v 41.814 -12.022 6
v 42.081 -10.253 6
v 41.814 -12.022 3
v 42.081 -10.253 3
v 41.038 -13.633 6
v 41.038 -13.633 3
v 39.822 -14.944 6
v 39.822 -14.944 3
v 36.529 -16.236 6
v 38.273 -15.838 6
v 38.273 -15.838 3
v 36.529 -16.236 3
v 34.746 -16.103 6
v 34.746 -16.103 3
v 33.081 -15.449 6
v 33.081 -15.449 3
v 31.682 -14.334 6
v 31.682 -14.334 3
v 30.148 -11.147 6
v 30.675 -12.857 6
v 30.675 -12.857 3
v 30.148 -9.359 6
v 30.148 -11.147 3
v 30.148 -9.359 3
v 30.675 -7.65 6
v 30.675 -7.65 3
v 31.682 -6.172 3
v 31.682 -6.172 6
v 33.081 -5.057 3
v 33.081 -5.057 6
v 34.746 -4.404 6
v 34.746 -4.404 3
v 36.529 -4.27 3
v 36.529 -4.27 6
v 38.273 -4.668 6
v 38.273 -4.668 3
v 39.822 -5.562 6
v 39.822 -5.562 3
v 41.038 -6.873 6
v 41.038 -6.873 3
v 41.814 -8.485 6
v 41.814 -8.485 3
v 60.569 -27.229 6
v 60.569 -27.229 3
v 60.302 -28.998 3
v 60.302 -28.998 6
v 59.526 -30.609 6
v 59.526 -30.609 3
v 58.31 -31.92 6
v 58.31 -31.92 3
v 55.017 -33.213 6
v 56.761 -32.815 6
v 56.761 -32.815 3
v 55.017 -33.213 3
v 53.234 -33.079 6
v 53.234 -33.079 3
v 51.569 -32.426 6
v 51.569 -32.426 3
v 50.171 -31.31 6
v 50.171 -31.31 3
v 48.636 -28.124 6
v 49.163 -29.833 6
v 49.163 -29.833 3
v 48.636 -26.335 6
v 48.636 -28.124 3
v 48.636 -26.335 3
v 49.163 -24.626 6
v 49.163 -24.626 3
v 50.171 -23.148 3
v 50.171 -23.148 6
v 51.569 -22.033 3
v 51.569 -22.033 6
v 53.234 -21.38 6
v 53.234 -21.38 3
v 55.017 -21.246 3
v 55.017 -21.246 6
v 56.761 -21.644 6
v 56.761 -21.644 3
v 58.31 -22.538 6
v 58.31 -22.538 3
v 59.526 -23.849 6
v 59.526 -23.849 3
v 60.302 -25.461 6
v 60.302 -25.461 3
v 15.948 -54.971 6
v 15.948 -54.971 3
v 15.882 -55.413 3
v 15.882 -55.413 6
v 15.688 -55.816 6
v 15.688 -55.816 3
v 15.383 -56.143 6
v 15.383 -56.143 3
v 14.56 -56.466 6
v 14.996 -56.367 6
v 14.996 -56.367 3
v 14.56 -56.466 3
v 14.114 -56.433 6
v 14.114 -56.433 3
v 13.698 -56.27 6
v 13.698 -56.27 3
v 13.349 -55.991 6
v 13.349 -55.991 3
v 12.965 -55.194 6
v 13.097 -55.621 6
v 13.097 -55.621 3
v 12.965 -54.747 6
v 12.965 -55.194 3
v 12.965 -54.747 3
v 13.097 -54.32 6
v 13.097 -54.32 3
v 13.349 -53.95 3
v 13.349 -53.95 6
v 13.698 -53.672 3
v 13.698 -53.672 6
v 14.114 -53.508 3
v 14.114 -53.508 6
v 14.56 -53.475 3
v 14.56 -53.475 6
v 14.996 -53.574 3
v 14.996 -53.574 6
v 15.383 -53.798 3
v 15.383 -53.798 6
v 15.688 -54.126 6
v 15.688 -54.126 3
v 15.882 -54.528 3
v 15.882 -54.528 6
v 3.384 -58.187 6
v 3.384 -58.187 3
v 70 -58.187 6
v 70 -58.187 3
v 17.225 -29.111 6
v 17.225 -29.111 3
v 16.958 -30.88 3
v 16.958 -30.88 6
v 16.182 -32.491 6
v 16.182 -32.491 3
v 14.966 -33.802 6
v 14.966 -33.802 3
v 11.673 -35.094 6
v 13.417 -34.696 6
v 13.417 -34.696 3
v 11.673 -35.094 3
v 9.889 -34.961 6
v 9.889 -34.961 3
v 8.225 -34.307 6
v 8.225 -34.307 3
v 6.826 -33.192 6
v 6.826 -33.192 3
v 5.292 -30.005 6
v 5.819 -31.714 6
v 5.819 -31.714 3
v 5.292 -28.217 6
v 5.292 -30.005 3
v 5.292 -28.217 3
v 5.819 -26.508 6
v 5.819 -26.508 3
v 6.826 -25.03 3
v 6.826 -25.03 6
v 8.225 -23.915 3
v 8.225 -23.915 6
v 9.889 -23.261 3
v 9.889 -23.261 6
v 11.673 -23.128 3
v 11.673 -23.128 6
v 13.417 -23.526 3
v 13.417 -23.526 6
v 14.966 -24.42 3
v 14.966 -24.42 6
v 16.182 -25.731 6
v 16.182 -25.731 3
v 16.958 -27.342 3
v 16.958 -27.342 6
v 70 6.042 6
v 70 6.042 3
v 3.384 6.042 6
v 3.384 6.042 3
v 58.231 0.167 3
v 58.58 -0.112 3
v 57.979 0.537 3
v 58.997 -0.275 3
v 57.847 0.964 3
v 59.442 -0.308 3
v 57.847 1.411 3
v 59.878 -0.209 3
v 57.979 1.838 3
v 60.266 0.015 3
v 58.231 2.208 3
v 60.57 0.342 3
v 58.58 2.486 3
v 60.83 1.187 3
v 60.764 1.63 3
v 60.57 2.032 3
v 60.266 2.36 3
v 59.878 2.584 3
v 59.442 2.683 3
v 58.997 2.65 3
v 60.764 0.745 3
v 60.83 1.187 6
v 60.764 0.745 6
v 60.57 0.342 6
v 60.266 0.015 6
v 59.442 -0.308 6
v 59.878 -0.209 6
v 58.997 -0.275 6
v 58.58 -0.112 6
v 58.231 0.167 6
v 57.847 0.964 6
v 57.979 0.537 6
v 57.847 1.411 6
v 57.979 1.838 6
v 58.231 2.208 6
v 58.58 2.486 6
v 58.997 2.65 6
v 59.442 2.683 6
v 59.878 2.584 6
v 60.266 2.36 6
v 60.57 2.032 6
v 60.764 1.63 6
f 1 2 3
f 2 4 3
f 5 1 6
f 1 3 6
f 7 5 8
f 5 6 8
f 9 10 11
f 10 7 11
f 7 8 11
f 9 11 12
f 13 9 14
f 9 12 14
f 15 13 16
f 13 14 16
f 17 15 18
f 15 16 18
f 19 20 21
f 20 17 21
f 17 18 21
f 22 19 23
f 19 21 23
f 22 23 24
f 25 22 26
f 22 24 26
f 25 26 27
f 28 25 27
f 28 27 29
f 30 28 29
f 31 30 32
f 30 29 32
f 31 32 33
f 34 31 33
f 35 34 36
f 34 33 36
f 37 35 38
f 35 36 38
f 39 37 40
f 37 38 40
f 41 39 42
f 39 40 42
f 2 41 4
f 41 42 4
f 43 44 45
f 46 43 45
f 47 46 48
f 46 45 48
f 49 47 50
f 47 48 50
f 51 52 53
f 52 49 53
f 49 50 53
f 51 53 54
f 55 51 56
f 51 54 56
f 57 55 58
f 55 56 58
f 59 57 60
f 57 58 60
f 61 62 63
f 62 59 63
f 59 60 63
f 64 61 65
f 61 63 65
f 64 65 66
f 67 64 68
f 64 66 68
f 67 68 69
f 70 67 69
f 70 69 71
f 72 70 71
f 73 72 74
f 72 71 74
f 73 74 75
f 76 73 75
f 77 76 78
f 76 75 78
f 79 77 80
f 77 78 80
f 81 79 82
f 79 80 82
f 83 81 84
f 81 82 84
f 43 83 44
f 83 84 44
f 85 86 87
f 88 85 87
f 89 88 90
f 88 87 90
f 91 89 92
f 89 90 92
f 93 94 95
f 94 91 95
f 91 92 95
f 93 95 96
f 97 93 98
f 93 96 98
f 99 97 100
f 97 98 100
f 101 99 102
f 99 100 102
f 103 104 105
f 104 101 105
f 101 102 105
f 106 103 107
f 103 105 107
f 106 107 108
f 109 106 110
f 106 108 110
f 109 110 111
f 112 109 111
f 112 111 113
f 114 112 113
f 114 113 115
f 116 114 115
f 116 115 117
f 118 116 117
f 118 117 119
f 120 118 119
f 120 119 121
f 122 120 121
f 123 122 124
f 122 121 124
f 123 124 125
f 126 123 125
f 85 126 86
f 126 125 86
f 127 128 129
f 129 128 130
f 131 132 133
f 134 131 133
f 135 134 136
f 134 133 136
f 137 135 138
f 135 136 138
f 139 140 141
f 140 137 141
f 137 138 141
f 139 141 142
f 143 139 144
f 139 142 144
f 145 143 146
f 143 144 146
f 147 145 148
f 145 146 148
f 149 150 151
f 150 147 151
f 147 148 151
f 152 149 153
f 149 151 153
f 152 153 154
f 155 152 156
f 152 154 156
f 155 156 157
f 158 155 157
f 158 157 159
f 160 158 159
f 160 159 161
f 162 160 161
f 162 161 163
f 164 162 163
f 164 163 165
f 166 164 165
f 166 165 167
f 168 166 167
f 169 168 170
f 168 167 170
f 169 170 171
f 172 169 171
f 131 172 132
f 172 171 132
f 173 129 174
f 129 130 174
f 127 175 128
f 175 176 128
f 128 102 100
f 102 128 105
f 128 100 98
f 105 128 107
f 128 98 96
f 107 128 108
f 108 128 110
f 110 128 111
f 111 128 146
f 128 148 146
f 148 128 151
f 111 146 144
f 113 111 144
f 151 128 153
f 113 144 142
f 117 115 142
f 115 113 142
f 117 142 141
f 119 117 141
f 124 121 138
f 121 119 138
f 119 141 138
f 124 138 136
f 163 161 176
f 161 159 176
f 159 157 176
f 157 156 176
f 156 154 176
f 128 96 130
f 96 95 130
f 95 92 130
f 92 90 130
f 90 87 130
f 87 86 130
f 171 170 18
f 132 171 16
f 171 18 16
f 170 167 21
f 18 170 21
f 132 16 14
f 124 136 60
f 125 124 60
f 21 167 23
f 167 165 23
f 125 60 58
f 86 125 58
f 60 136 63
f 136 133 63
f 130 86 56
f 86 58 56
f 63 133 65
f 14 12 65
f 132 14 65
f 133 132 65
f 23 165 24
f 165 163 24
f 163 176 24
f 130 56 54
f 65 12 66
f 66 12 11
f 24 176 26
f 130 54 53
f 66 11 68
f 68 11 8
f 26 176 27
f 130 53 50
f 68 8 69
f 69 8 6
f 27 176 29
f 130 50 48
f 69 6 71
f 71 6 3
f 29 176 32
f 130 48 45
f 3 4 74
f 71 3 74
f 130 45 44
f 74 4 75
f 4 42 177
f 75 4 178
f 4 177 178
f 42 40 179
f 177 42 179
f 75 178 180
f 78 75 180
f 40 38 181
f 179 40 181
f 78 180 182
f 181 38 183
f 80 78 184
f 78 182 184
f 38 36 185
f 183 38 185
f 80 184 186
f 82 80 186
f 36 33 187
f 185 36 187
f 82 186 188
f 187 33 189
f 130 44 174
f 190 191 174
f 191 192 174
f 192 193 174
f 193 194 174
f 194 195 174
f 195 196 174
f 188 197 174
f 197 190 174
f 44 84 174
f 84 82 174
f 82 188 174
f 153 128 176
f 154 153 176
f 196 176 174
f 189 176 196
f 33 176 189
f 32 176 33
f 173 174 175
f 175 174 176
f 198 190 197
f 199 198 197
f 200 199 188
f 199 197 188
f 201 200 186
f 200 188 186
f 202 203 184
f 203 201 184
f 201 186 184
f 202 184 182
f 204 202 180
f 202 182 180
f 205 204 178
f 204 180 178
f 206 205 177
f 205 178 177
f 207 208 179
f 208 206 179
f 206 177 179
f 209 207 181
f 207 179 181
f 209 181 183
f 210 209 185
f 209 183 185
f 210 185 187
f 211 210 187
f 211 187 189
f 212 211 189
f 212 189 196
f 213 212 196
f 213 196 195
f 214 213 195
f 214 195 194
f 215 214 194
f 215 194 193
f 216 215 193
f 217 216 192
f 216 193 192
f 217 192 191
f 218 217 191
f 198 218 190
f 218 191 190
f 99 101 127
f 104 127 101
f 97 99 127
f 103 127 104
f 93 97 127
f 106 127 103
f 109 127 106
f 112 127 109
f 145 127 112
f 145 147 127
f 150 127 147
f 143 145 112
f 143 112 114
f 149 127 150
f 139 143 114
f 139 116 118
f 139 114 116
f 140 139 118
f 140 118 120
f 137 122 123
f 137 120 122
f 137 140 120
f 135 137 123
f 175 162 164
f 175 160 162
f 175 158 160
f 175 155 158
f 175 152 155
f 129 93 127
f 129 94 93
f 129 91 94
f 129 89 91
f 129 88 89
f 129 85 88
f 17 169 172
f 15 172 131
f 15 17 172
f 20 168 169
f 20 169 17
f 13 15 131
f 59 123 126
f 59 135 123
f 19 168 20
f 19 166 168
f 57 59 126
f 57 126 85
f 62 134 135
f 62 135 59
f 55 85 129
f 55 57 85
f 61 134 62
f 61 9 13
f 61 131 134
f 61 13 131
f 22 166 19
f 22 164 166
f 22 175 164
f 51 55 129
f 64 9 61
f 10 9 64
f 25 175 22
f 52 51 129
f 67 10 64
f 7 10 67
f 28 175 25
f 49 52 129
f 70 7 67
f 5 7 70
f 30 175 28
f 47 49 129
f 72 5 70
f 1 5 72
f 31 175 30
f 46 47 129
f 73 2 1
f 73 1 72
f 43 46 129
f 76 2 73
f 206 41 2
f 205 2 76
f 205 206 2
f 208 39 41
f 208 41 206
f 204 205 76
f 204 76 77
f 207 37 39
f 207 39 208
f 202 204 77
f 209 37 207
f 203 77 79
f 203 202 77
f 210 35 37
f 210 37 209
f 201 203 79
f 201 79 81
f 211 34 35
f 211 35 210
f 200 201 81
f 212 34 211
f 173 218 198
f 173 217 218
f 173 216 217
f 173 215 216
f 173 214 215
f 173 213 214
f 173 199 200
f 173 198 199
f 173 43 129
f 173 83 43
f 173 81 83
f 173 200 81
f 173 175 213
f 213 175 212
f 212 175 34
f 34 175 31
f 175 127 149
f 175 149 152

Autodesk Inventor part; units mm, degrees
ref_plane "YZ Plane" through (0, 0, 0) normal (1, 0, 0) x (0, 1, 0)
sketch "ギア線図" plane through (0, 0, 0) normal (0, 0, 1) x (1, 0, 0)
  circle A0 centre (11.2246, -29.111) radius 11.1
  circle A1 centre (54.569, -27.2294) radius 20.05
  circle A2 centre (54.569, -27.2294) radius 4.55
  circle A3 centre (36.0807, -10.2532) radius 11.1
  circle A4 centre (39.569, -43.72) radius 2.05
  circle A5 centre (69.569, -43.72) radius 2.05
  circle A6 centre (72.4026, -13.8541) radius 2.05
  circle A7 centre (39.569, -43.72) radius 15
  circle A8 centre (69.569, -43.72) radius 15
  circle A9 centre (72.4026, -13.8541) radius 15
  circle A10 centre (54.569, -27.2294) radius 5.5 construction
  circle A11 centre (11.2246, -29.111) radius 13 construction
  circle A12 centre (54.569, -27.2294) radius 20.5 construction
  circle A13 centre (36.0807, -10.2532) radius 20.55
  circle A14 centre (36.0807, -10.2532) radius 21.5 construction
  circle A15 centre (36.0807, -10.2532) radius 13 construction
  circle A16 centre (39.569, -43.72) radius 2.5 construction
  circle A17 centre (69.569, -43.72) radius 2.5 construction
  circle A18 centre (72.4026, -13.8541) radius 2.5 construction
  circle A19 centre (11.2246, -29.111) radius 20.1
  circle A20 centre (11.2246, -29.111) radius 22 construction
  line L0 (39.569, -43.72) -> (69.569, -43.72)
  circle A21 centre (0, 0) radius 20.1
  circle A22 centre (0, 0) radius 22 construction
  circle A23 centre (39.569, -43.72) radius 9.5 construction
  circle A24 centre (69.569, -43.72) radius 9.5 construction
  circle A25 centre (72.4026, -13.8541) radius 9.5 construction
  line L1 (54.569, -27.2294) -> (39.569, -43.72)
  line L2 (39.569, -43.72) -> (33.651, -38.3369)
  circle A26 centre (33.651, -38.3369) radius 2.25
  point P0 (58.2233, -20.0465)
  point P1 (42.0436, -35)
  point P2 (21.5995, 15.2696)
  point P3 (38.2329, 5.9161)
  point P4 (24.1755, 8.4229)
  point P5 (21.6039, 15.1272)
  point P6 (23.3458, 16.3469)
  point P7 (23.3177, 16.3886)
  dimension "d7" = 22.2
  dimension "d8" = 40.1
  dimension "d9" = 9.1
  dimension "d11" = 22.2
  dimension "d12" = 4.1
  dimension "d13" = 4.1
  dimension "d14" = 4.1
  dimension "d15" = 30
  dimension "d16" = 30
  dimension "d17" = 30
  dimension "d18" = 11
  dimension "d21" = 26
  dimension "d29" = 41
  dimension "d39" = 22.2921
  dimension "d40" = 22.2921
  dimension "d41" = 22.2921
  dimension "d43" = 41.1
  dimension "d44" = 43
  dimension "d45" = 26
  dimension "d46" = 5
  dimension "d47" = 5
  dimension "d48" = 5
  dimension "d49" = 40.2
  dimension "d50" = 44
  dimension "d53" = 40.2
  dimension "d55" = 44
  dimension "d58" = 19
  dimension "d59" = 19
  dimension "d60" = 19
  dimension "d90" = 8
  dimension "d91" = 4.5
ref_plane "作業平面4" through (0, 0, 3) normal (0, 0, 1) x (1, 0, 0)
sketch "スケッチ5" plane through (0, 0, 3) normal (0, 0, 1) x (1, 0, 0)
  circle A0 centre (10.6068, -54.0855) radius 1.5 projected
  circle A1 centre (23.1948, 12.8161) radius 1.5 projected
  circle A2 centre (59.3303, 1.1874) radius 1.5 projected
  circle A3 centre (54.3074, -26.8895) radius 5 projected
  circle A4 centre (35.8191, -9.9133) radius 5 projected
  point P0 (0, 0)
ref_plane "作業平面1" through (0, 0, 3) normal (0, 0, 1) x (1, 0, 0)
sketch "スケッチ6" plane through (0, 0, 3) normal (0, 0, 1) x (1, 0, 0)
  circle A0 centre (59.3303, 1.1874) radius 1.5 projected
  line L0 (3.3835, -58.1874) -> (70, -58.1874)
  line L1 (70, -58.1874) -> (70, 6.042)
  line L2 (70, 6.042) -> (3.3835, 6.042)
  line L3 (3.3835, 6.042) -> (3.3835, -58.1874)
  circle A1 centre (11.2246, -29.111) radius 11.1 projected
  circle A2 centre (36.0807, -10.2532) radius 11.1 projected
  circle A3 centre (54.569, -27.2294) radius 4.55 projected
  circle A4 centre (11.2246, -29.111) radius 6
  circle A5 centre (36.0807, -10.2532) radius 6
  circle A6 centre (54.569, -27.2294) radius 6
  circle A7 centre (14.4482, -54.9706) radius 1.5
  circle A8 centre (23.1948, 12.8161) radius 1.5
  circle A9 centre (59.3303, 1.1874) radius 1.5
  circle A10 centre (54.3074, -26.8895) radius 5
  circle A11 centre (35.8191, -9.9133) radius 5
  point P0 (0, 0)
  point P1 (0, 0)
  dimension "d85" = 12
  dimension "d86" = 12
  dimension "d87" = 12
extrude "押し出し3" add sketch "スケッチ6" along normal blind 3 contours L3 A1 L2 L1 L0 | L3 A1 | A2 picked at (3.9972, -29.111)
equation "\"d40\" = d39"
equation "\"d41\" = d40"
properties part number "アームフレーム改" material "アルミニウム 2014-T4"
